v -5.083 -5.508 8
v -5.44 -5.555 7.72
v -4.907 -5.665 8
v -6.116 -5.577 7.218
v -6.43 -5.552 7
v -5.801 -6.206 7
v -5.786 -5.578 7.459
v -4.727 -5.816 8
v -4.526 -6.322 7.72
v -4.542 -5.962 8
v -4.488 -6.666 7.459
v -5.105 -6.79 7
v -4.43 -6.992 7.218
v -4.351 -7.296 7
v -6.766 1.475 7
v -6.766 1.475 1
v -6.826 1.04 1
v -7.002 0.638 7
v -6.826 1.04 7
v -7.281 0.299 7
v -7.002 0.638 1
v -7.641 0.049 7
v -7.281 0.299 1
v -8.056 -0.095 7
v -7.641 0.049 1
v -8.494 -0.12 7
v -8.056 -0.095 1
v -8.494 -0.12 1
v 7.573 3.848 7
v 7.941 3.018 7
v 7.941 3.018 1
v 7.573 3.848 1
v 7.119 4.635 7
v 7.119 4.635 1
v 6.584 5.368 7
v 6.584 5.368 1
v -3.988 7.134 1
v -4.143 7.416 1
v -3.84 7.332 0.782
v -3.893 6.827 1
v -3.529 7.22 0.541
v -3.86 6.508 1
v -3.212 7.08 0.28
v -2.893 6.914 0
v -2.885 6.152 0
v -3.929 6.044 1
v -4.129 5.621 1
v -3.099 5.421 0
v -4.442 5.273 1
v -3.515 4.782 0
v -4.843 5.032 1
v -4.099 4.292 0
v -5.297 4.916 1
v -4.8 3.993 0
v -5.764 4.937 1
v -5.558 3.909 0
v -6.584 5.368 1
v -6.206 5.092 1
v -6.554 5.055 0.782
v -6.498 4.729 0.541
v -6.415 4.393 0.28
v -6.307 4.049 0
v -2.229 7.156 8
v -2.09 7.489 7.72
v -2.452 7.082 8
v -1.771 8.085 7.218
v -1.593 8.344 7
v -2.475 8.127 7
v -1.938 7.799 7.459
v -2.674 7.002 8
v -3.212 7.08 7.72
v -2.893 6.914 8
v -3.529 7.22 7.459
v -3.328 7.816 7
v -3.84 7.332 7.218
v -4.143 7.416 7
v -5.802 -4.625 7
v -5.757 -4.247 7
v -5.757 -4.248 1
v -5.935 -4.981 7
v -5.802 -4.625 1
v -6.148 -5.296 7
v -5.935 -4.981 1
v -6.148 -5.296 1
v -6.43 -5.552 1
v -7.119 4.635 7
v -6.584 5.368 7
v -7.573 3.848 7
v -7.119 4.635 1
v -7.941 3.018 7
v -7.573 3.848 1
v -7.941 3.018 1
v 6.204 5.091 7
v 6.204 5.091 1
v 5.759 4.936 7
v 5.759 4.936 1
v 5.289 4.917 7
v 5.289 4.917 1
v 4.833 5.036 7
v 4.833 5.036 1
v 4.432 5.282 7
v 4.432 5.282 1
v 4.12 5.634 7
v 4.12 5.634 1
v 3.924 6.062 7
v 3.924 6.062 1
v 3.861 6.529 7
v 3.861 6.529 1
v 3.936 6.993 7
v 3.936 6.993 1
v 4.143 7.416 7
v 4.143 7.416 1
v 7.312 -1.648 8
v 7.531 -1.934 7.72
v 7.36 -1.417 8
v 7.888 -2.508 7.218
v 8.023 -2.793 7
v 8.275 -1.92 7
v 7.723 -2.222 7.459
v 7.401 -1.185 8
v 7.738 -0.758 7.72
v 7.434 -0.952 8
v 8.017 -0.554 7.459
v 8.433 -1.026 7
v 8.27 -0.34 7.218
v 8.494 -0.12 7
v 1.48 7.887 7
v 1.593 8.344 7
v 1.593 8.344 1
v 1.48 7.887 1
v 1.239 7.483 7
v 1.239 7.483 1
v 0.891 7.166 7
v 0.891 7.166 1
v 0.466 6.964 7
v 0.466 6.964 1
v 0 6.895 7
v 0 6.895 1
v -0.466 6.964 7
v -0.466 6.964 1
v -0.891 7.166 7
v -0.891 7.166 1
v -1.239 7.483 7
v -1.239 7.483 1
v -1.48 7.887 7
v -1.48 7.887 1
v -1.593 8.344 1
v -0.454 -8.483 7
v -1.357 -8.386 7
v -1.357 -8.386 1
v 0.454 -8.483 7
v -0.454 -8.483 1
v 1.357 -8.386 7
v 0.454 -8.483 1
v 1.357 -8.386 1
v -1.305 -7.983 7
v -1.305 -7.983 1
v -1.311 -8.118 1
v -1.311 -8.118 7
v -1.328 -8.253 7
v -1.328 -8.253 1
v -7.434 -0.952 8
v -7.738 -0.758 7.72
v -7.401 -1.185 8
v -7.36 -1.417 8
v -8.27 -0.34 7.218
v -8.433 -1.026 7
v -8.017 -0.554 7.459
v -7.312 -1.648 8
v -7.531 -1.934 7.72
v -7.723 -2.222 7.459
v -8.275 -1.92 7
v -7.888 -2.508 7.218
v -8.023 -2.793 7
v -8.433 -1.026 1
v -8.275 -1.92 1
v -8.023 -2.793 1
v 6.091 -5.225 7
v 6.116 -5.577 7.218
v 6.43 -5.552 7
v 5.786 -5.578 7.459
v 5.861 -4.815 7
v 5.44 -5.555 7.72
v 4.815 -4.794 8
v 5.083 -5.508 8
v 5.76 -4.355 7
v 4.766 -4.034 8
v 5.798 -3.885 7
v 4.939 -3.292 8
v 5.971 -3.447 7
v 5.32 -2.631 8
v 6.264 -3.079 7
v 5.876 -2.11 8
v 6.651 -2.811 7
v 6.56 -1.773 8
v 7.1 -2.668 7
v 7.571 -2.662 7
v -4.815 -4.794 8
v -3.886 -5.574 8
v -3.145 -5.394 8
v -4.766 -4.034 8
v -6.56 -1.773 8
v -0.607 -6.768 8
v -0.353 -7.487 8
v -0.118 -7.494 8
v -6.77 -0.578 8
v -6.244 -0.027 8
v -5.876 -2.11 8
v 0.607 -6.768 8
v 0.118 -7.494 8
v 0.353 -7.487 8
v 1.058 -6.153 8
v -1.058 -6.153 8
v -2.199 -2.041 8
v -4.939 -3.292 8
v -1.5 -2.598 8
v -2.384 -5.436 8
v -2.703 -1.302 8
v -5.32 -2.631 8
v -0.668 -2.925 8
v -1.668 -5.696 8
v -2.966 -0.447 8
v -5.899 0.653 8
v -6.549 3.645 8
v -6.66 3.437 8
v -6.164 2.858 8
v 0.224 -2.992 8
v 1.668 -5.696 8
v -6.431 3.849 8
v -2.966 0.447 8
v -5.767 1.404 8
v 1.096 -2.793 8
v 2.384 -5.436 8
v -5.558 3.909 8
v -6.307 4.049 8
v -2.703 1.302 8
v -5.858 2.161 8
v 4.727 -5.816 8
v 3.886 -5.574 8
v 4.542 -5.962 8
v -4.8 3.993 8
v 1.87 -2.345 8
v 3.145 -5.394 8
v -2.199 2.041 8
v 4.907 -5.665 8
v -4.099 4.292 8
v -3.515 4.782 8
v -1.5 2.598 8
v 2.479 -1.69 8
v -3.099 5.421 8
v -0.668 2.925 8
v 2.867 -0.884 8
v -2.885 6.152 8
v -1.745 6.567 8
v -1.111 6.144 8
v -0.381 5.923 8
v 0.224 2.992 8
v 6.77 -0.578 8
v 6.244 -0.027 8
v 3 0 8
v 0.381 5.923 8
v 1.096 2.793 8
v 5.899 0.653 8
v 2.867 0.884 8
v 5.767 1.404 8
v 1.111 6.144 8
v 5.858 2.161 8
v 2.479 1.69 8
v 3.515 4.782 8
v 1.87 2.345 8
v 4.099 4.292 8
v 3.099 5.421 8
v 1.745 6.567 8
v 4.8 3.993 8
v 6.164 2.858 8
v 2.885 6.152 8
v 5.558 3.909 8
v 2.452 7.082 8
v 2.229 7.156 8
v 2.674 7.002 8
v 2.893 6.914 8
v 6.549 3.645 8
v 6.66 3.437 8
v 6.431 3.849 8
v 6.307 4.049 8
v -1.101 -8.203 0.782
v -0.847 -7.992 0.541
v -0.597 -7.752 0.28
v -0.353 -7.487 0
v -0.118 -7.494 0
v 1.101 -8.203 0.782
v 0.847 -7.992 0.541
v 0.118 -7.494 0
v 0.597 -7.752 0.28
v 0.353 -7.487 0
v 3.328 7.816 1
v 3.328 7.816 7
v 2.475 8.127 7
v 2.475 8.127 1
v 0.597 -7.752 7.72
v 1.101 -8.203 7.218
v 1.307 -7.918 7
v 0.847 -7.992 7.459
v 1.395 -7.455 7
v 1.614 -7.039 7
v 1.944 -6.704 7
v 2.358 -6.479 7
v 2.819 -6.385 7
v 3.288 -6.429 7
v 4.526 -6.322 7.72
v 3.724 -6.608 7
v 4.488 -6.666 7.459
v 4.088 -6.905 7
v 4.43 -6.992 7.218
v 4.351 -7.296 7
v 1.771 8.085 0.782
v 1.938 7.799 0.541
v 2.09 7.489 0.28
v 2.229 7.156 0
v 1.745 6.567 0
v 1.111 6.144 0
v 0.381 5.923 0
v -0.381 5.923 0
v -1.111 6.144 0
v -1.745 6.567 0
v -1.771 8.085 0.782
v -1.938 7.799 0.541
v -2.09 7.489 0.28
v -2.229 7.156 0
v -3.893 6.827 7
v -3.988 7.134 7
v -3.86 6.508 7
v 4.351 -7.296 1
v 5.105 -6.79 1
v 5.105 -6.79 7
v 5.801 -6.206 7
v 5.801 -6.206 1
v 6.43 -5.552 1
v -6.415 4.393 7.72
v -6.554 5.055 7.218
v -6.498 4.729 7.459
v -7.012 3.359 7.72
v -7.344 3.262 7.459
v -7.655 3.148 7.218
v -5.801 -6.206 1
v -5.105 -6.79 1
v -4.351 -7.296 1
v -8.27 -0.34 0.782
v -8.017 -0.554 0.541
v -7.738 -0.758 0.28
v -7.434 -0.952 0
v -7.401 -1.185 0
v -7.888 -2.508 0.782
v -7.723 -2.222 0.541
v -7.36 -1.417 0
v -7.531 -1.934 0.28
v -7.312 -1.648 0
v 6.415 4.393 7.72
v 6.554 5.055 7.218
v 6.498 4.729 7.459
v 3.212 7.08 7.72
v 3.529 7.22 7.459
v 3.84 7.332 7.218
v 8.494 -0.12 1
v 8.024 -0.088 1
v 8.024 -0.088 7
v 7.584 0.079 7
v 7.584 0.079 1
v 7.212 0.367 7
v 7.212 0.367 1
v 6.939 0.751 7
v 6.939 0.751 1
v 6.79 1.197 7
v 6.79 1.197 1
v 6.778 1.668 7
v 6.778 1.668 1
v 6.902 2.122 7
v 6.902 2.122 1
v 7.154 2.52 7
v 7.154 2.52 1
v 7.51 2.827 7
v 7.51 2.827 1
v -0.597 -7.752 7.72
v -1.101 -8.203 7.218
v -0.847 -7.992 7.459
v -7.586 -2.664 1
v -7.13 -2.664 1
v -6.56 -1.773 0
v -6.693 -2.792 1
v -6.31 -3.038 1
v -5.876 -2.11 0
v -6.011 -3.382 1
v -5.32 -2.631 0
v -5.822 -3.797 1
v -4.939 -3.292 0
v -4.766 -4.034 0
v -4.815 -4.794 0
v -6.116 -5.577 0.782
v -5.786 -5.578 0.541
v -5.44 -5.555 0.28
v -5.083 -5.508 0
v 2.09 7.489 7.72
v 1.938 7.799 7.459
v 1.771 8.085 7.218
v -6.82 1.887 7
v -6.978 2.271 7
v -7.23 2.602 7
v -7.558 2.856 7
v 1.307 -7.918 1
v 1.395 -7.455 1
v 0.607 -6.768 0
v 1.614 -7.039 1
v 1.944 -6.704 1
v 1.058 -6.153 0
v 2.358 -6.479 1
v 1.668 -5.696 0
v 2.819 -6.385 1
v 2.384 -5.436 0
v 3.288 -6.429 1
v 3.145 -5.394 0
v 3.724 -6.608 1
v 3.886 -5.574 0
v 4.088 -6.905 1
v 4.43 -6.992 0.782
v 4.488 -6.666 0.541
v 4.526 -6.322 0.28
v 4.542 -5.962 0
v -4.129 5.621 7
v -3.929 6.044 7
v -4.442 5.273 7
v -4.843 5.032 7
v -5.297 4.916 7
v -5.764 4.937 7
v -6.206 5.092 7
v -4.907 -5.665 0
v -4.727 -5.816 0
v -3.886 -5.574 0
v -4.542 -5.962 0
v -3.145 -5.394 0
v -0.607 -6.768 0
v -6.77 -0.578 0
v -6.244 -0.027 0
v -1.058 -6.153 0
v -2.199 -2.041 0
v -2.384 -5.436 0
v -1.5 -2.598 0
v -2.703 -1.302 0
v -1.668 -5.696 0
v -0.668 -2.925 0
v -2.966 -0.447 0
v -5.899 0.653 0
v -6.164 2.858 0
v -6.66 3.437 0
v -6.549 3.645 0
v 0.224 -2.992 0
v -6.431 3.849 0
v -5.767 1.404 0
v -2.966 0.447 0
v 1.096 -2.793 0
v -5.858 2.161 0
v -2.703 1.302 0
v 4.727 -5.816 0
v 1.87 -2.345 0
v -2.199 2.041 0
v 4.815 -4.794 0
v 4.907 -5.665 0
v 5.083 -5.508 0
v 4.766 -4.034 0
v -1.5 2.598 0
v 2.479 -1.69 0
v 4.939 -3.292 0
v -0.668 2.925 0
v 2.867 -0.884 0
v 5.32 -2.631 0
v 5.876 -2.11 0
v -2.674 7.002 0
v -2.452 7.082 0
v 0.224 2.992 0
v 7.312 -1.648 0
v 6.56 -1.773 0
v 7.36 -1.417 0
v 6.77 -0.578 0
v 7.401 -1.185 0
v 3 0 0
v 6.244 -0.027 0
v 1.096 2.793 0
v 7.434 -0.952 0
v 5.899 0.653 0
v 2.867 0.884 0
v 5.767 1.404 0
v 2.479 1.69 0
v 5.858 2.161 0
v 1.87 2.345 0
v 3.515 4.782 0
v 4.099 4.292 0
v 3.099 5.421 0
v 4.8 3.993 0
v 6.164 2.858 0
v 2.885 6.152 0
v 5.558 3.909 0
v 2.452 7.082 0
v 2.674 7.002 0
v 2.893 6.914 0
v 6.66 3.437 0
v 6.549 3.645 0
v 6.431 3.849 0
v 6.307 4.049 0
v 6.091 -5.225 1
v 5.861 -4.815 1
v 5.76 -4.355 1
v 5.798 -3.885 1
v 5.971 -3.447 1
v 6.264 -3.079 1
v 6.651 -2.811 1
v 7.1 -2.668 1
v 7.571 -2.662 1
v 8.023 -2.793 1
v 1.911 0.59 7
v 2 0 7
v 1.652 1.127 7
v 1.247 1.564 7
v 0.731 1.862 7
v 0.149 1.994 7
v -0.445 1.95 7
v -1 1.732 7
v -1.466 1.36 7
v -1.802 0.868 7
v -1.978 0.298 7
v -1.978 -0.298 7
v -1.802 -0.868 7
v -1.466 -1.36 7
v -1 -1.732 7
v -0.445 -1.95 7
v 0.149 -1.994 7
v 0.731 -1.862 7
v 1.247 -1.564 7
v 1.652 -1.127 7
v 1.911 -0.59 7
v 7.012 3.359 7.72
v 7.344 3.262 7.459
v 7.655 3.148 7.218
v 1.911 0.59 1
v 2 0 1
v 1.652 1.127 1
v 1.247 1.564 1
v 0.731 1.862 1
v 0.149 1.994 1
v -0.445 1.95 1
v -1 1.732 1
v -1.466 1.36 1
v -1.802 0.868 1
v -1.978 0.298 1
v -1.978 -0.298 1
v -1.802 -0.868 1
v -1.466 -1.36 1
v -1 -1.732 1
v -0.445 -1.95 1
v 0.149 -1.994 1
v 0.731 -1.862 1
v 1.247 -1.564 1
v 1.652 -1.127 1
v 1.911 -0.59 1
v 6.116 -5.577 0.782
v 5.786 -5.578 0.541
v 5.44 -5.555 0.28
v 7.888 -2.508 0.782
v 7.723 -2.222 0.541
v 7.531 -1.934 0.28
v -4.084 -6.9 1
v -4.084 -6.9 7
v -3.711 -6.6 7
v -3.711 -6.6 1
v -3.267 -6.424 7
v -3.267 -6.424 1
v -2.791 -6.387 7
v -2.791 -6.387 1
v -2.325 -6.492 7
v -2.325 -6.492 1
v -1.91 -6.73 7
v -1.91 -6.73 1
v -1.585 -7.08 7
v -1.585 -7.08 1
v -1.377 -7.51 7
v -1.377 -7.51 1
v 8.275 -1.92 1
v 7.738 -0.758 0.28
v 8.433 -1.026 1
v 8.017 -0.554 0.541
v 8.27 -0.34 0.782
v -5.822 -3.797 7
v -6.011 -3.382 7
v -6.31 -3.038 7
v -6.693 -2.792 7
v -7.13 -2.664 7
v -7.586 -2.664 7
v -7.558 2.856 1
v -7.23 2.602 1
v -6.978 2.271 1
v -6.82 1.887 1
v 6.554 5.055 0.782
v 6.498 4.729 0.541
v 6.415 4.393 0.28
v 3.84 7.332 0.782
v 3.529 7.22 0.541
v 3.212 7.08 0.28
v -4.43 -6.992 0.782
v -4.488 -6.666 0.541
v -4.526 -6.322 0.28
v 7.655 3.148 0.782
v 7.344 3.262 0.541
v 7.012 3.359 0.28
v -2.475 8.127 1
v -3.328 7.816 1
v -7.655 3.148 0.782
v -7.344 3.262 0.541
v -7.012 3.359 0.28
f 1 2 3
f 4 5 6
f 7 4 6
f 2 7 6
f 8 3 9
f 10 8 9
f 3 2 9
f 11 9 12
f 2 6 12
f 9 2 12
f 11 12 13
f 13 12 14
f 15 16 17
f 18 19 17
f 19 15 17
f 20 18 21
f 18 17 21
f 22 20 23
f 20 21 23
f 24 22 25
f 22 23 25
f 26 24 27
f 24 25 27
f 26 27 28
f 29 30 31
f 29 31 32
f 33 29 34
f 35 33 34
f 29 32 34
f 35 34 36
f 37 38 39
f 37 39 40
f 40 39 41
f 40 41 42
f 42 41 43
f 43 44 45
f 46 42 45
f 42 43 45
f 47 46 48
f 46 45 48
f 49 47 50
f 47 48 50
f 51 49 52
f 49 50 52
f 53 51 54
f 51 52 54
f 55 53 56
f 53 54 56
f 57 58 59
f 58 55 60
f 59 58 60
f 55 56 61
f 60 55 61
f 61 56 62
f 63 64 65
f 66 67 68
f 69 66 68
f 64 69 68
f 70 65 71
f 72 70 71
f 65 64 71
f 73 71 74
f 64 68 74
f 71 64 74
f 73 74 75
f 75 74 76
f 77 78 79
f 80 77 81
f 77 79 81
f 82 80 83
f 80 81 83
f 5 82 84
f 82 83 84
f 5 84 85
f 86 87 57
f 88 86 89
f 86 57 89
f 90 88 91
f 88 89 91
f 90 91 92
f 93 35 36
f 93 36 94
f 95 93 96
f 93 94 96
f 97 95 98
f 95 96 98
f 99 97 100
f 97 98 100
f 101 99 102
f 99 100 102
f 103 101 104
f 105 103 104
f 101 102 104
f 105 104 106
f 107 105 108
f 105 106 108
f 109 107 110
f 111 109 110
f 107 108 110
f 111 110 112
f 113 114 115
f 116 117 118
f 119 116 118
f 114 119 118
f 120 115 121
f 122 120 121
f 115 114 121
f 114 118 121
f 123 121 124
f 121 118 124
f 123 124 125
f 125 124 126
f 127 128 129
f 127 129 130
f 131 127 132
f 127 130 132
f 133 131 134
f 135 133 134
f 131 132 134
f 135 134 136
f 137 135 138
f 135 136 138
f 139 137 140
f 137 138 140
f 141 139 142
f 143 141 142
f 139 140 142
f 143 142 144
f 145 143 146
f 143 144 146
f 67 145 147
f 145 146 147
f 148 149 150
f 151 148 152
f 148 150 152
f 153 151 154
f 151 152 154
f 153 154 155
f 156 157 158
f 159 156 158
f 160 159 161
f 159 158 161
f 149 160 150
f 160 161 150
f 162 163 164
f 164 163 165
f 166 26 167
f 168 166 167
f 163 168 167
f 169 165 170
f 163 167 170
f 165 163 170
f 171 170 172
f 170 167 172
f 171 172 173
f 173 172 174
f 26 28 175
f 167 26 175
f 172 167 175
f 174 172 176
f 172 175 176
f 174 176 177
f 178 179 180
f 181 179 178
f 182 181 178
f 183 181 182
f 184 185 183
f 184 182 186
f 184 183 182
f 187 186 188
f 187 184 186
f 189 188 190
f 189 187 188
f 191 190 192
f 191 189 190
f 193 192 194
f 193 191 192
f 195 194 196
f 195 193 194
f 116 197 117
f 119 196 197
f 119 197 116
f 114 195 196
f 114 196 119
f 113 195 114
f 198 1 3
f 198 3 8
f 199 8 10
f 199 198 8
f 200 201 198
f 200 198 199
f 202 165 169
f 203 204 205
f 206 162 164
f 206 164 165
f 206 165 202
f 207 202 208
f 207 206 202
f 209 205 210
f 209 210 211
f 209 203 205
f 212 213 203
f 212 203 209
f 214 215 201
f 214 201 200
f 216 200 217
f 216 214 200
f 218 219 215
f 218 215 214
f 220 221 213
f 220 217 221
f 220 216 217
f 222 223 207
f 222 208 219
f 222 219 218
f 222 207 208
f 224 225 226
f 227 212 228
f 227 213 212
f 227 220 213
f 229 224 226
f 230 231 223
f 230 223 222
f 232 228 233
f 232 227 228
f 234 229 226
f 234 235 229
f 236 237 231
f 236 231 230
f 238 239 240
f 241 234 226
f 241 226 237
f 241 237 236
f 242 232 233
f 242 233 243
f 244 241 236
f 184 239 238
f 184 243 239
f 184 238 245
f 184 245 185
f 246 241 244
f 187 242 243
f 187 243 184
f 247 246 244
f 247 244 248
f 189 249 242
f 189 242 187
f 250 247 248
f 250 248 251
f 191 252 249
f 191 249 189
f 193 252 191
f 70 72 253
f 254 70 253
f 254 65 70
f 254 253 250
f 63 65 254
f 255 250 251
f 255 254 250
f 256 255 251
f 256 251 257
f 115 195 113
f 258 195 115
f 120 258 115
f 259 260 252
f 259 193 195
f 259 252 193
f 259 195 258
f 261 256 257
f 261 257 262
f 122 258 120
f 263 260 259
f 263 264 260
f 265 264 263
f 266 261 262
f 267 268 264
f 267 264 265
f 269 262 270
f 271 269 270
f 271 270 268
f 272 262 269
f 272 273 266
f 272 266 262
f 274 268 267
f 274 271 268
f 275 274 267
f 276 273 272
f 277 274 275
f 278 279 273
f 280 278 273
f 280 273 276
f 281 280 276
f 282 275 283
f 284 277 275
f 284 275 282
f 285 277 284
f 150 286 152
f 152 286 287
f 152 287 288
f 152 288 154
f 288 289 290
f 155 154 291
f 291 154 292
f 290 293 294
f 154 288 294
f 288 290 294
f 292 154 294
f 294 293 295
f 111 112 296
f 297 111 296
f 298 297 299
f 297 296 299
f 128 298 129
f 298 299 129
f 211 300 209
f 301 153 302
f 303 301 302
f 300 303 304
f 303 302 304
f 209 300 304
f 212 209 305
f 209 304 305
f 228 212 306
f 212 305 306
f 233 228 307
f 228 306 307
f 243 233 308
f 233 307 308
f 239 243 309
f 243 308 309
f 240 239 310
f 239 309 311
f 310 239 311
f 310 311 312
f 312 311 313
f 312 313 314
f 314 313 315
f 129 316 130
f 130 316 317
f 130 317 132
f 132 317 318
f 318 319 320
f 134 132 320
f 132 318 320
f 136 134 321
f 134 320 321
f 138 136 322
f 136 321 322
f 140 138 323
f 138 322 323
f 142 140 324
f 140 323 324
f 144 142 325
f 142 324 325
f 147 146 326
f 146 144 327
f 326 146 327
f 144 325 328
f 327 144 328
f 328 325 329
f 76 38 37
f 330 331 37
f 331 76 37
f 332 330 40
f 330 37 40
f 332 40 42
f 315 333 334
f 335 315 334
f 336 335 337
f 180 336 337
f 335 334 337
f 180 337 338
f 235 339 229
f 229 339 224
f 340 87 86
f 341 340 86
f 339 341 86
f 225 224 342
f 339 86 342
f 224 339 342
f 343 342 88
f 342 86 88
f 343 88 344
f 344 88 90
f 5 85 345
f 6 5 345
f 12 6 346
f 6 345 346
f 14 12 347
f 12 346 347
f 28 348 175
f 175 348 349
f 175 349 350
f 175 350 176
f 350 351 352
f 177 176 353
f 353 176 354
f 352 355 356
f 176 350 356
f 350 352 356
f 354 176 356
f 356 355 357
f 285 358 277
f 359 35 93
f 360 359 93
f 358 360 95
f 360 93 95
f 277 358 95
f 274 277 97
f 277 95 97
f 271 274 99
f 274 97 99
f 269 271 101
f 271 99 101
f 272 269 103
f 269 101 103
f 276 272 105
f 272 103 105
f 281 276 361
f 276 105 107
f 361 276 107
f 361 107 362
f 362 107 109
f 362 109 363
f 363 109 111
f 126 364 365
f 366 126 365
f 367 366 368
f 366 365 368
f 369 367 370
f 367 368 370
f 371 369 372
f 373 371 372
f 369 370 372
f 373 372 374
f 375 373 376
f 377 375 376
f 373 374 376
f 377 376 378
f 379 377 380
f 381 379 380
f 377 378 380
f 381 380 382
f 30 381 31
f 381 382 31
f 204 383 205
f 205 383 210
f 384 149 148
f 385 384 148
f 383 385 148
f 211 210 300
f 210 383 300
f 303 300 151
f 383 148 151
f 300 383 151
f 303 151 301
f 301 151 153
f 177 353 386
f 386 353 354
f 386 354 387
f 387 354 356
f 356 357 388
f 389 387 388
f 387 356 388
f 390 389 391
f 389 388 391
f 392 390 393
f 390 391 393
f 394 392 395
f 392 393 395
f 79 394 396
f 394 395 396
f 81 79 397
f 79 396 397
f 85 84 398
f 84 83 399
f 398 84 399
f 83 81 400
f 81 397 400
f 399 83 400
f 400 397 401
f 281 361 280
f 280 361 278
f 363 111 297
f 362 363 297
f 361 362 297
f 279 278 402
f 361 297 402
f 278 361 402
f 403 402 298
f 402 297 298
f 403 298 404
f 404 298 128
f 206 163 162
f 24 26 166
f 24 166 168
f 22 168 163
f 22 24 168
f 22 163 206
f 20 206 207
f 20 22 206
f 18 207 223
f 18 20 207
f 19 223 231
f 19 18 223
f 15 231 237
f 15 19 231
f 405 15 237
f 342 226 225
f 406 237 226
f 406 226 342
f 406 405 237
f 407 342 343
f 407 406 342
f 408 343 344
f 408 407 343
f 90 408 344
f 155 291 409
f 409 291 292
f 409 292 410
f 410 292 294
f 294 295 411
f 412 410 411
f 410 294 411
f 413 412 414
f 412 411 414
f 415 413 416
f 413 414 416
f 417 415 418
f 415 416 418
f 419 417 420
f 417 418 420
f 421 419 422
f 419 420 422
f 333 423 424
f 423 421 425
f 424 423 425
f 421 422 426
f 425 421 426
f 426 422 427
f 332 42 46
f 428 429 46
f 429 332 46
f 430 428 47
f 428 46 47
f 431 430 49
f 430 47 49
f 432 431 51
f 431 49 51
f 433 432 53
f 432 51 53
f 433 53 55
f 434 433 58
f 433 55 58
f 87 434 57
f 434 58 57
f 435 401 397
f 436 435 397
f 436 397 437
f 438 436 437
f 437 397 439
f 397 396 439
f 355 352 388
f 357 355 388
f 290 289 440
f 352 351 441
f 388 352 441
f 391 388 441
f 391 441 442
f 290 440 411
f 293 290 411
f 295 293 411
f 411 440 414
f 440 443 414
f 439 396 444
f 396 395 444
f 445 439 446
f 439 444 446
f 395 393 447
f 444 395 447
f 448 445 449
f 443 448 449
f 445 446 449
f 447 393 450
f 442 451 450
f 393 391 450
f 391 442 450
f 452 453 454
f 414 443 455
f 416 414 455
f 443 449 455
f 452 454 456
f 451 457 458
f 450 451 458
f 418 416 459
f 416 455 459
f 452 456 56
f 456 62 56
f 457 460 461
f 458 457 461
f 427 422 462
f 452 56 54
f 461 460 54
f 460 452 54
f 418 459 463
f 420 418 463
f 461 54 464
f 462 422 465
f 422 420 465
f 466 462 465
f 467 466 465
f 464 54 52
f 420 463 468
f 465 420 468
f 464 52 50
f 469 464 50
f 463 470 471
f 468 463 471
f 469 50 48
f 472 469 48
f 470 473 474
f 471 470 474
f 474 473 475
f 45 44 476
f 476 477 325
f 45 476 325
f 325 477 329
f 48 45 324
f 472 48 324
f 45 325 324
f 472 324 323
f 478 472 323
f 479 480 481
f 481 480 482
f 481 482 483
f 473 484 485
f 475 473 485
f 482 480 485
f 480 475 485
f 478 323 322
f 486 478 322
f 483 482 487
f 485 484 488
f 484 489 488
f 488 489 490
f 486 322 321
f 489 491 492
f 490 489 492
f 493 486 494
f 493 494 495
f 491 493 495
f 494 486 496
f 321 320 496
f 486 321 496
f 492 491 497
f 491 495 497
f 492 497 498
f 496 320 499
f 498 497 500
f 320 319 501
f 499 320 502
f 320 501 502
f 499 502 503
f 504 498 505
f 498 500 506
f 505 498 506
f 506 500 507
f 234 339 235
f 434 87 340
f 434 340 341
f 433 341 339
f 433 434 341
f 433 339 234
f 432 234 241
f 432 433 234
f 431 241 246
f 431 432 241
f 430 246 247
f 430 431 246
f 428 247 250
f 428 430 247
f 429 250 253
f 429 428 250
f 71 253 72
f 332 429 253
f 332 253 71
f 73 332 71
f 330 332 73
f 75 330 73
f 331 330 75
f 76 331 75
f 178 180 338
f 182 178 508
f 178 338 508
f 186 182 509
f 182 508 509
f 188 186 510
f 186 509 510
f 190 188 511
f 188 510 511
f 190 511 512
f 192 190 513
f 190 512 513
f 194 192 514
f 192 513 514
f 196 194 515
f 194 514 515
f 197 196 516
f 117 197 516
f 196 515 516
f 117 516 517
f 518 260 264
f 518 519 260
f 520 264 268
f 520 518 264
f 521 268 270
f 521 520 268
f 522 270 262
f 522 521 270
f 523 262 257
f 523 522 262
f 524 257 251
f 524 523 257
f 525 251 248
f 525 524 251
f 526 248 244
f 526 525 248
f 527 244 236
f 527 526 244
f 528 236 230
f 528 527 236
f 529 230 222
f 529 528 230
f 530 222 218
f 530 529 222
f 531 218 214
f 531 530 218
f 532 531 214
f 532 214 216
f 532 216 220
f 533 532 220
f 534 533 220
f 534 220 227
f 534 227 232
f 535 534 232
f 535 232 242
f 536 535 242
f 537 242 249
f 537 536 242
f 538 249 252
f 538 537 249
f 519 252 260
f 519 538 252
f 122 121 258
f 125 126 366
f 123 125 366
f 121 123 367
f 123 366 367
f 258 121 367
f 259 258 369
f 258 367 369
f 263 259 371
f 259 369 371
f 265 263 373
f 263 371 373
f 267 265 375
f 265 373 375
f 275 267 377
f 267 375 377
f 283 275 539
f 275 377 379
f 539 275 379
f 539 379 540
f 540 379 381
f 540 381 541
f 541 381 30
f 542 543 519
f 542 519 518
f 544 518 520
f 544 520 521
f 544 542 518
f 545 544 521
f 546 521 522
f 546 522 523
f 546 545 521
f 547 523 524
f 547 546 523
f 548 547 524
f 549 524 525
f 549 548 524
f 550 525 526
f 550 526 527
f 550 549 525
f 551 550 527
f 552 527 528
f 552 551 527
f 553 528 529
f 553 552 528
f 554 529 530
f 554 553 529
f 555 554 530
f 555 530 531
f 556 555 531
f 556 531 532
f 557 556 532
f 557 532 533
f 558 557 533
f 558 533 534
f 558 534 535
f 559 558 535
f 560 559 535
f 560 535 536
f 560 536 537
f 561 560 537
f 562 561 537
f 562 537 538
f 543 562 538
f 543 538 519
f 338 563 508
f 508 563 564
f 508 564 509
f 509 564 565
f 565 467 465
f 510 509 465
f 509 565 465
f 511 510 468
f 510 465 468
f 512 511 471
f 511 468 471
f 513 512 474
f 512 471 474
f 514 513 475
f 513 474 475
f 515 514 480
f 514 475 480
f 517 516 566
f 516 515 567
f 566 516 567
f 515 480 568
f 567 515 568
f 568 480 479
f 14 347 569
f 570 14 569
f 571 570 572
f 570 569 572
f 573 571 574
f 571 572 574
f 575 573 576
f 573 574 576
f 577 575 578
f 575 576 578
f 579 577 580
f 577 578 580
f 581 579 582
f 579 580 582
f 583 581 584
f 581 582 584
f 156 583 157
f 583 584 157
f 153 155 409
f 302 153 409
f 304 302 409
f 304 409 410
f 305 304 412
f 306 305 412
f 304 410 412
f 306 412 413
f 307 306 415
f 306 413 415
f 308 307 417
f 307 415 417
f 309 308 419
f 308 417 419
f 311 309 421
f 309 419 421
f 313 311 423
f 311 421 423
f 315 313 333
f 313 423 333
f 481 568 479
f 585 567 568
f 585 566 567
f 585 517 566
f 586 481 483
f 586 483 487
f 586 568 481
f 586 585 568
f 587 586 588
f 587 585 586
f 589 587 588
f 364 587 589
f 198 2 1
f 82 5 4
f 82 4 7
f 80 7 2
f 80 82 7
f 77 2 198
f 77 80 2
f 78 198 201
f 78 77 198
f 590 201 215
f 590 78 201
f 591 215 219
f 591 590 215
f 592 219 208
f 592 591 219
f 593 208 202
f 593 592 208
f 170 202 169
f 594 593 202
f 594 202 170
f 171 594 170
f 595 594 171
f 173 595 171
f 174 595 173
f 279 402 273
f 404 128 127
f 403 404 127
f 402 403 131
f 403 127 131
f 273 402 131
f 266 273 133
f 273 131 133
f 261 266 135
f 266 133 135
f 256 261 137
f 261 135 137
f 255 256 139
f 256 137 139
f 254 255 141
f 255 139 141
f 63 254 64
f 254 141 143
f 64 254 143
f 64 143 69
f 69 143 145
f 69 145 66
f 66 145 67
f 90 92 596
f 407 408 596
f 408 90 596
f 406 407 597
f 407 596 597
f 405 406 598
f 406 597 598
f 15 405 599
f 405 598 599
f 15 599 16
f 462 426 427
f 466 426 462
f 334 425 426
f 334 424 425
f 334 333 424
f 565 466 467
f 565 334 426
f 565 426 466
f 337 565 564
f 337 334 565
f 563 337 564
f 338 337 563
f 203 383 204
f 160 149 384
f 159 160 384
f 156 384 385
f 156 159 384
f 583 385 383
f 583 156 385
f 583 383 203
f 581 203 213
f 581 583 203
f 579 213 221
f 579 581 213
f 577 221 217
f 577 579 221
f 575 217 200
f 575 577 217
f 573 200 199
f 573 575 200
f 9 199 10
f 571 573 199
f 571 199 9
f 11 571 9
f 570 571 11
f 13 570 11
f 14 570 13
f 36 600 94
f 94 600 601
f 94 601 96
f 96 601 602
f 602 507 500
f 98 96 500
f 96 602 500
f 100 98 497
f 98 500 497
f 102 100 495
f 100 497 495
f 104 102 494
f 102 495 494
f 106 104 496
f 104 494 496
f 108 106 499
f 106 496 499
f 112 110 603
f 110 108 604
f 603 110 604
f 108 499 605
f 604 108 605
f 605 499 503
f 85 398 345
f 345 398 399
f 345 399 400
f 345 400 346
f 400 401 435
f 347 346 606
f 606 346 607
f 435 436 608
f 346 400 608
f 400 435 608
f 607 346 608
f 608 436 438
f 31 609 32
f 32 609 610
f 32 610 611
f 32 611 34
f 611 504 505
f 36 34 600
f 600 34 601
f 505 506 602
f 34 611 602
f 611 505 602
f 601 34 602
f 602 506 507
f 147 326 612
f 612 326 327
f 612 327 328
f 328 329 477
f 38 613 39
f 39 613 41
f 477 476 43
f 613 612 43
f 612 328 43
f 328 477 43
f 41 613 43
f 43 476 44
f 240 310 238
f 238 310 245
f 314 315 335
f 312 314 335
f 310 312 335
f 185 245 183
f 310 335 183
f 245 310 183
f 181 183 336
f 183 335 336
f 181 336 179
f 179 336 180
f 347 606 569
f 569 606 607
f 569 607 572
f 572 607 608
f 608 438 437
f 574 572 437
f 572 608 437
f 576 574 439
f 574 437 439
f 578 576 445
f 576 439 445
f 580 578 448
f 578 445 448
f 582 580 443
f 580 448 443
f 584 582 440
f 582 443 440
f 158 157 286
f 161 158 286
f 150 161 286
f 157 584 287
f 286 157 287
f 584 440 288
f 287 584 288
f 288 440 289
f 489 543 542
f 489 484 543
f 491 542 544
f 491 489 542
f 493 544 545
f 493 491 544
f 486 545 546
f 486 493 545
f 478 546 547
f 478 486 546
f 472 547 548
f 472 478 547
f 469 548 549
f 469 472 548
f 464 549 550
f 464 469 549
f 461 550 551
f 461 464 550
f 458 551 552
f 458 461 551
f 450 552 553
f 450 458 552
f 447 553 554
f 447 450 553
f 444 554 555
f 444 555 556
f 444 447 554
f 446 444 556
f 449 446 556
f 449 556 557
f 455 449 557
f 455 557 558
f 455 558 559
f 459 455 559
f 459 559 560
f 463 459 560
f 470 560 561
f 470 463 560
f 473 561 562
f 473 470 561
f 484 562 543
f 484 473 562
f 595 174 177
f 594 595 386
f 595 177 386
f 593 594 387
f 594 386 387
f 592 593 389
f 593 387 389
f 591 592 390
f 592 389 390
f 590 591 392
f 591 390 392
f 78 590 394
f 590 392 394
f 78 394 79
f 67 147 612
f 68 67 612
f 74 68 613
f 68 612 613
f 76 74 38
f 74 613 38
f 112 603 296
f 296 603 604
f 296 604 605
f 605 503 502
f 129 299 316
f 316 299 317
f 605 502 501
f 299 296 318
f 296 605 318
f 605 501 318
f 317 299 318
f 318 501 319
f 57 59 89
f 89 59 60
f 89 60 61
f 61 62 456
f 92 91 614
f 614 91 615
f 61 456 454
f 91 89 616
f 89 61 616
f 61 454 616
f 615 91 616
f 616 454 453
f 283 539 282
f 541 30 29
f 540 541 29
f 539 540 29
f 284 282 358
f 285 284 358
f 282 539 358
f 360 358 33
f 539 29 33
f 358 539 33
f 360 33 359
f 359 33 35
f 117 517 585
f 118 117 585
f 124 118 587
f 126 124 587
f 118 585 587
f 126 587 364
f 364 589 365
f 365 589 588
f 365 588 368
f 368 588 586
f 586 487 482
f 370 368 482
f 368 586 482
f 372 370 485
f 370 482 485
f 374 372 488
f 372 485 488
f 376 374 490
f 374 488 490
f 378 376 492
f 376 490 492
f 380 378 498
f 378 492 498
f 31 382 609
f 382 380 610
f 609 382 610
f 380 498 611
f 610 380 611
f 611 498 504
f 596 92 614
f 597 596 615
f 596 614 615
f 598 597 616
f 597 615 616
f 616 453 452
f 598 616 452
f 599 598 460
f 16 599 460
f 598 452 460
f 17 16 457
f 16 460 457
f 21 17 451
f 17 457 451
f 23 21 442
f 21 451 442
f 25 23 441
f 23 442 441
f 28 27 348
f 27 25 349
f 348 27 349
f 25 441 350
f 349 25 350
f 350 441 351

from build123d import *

# Parameters (mm, degrees)
F0_R         = 2
F1_DEPTH     = 8
F2_T2_ANGLE  = 353.6374425132
F2_T4_ANGLE  = 53.075870109
F2_T6_ANGLE  = 353.6374425132
F2_T8_ANGLE  = 53.075870109
F2_T10_ANGLE = 353.6374425132
F2_T12_ANGLE = 53.075870109
F2_T14_ANGLE = 353.6374425132
F2_T16_ANGLE = 53.075870109
F2_T18_ANGLE = 353.6374425132
F2_T20_ANGLE = 53.075870109
F2_T22_ANGLE = 353.6374425132
F2_T24_ANGLE = 53.075870109
F2_T26_ANGLE = 353.6374425132
F2_T28_ANGLE = 53.075870109
F2_T30_ANGLE = 353.6374425132
F2_T32_ANGLE = 53.075870109
F2_T34_ANGLE = 353.6374425132
F2_T36_ANGLE = 53.075870109
F2_T40_ANGLE = 353.6374425132
F2_T42_ANGLE = 53.075870109
F2_T44_ANGLE = 353.6374425132
F2_T46_ANGLE = 53.075870109
F2_T48_ANGLE = 353.6374425132
F2_T50_ANGLE = 53.075870109
F2_T52_ANGLE = 353.6374425132
F2_T54_ANGLE = 53.075870109
F2_T56_ANGLE = 353.6374425132
F2_T58_ANGLE = 53.075870109
F2_T60_ANGLE = 353.6374425132
F2_T62_ANGLE = 53.075870109
F2_T64_ANGLE = 353.6374425132
F2_T66_ANGLE = 53.075870109
F2_T68_ANGLE = 353.6374425132
F2_T70_ANGLE = 53.075870109
F2_T72_ANGLE = 353.6374425132
F2_T74_ANGLE = 53.075870109


# Not quite as in the source:
# - a fillet or chamfer that OpenCascade refuses, or shapes differently, is made with other operations: its cross-section is extruded or revolved along the edge and cut away or added


with BuildPart() as f1:
    # F0 (on Top) → F1 (new body)
    with BuildSketch(Plane.XY):
        with BuildLine():
            ThreePointArc((8.4941564461, -0.1197132759), (6.790249457, 1.197304185), (7.9409517805, 3.0176662871))
            ThreePointArc((7.9409517805, 3.0176662871), (7.3568858051, 4.2475), (6.583851555, 5.3682328285))
            ThreePointArc((6.583851555, 5.3682328285), (4.4320205688, 5.2818764353), (4.1434034849, 7.416011904))
            ThreePointArc((4.1434034849, 7.416011904), (2.9054611176, 7.9826888136), (1.59288935, 8.3443231313))
            ThreePointArc((1.59288935, 8.3443231313), (0, 6.895), (-1.59288935, 8.3443231313))
            ThreePointArc((-1.59288935, 8.3443231313), (-2.9054611176, 7.9826888136), (-4.1434034849, 7.416011904))
            ThreePointArc((-4.1434034849, 7.416011904), (-3.932847998, 6.983297681), (-3.8604807443, 6.5075475443))
            ThreePointArc((-3.8604807443, 6.5075475443), (-4.8429830913, 5.0315066747), (-6.583851555, 5.3682328285))
            ThreePointArc((-6.583851555, 5.3682328285), (-7.3568858051, 4.2475), (-7.9409517805, 3.0176662871))
            ThreePointArc((-7.9409517805, 3.0176662871), (-7.0931527728, 2.4446813329), (-6.7659418618, 1.4751412693))
            ThreePointArc((-6.7659418618, 1.4751412693), (-7.2808481642, 0.2993131919), (-8.4941564461, -0.1197132759))
            ThreePointArc((-8.4941564461, -0.1197132759), (-8.3659418618, -1.4751412693), (-8.022840484, -2.7926789231))
            ThreePointArc((-8.022840484, -2.7926789231), (-6.4924575219, -2.90111085), (-5.7568858051, -4.2475))
            ThreePointArc((-5.7568858051, -4.2475), (-5.9350743771, -4.9812930656), (-6.4299511341, -5.5516442081))
            ThreePointArc((-6.4299511341, -5.5516442081), (-5.4604807443, -6.5075475443), (-4.3507529612, -7.2962986281))
            ThreePointArc((-4.3507529612, -7.2962986281), (-2.5536564486, -6.4218449793), (-1.3054611176, -7.9826888136))
            ThreePointArc((-1.3054611176, -7.9826888136), (-1.318423401, -8.1859405941), (-1.3571002254, -8.3858991157))
            ThreePointArc((-1.3571002254, -8.3858991157), (0, -8.495), (1.3571002254, -8.3858991157))
            ThreePointArc((1.3571002254, -8.3858991157), (2.3582288882, -6.4791806203), (4.3507529612, -7.2962986281))
            ThreePointArc((4.3507529612, -7.2962986281), (5.4604807443, -6.5075475443), (6.4299511341, -5.5516442081))
            ThreePointArc((6.4299511341, -5.5516442081), (5.9712451591, -3.4475), (8.022840484, -2.7926789231))
            ThreePointArc((8.022840484, -2.7926789231), (8.3659418618, -1.4751412693), (8.4941564461, -0.1197132759))
        make_face()
        Circle(F0_R, mode=Mode.SUBTRACT)
    extrude(amount=F1_DEPTH)

    # F2: chamfer of 1 on 38 edges, made by hand

    # F2_s1 → F2_t2 (revolve, cut)
    with BuildSketch(Plane(origin=(0.2580100634, 0.3945620225, 0), x_dir=(0, 0, 1), z_dir=(0.5472897836, 0.8369431837, 0))):
        Polygon((7, 10.0819087839), (8, 11.0819087839), (8, 10.0819087839), align=None)
    revolve(axis=Axis((7.3568858051, -4.2475, 8), (0, 0, -1)), revolution_arc=F2_T2_ANGLE, mode=Mode.SUBTRACT)

    # F2_s3 → F2_t4 (revolve, cut)
    with BuildSketch(Plane(origin=(0, 0, 0), x_dir=(0, 0, 1), z_dir=(-0.5953548832, -0.8034628573, 0))):
        Polygon((8, -7.495), (7, -8.495), (8, -8.495), align=None)
    revolve(axis=Axis((0, 0, 8), (0, 0, 1)), revolution_arc=F2_T4_ANGLE, mode=Mode.SUBTRACT)

    # F2_s5 → F2_t6 (revolve, cut)
    with BuildSketch(Plane(origin=(-0.055972404, 0.4680977167, 0), x_dir=(0, 0, 1), z_dir=(-0.118728411, 0.9929267669, 0))):
        Polygon((8, 11.0819087839), (7, 10.0819087839), (8, 10.0819087839), align=None)
    revolve(axis=Axis((8.3659418618, 1.4751412693, 8), (0, 0, -1)), revolution_arc=F2_T6_ANGLE, mode=Mode.SUBTRACT)

    # F2_s7 → F2_t8 (revolve, cut)
    with BuildSketch(Plane(origin=(0, 0, 0), x_dir=(0, 0, 1), z_dir=(0.0603876695, -0.9981749994, 0))):
        Polygon((8, -7.495), (7, -8.495), (8, -8.495), align=None)
    revolve(axis=Axis((0, 0, 8), (0, 0, 1)), revolution_arc=F2_T8_ANGLE, mode=Mode.SUBTRACT)

    # F2_s9 → F2_t10 (revolve, cut)
    with BuildSketch(Plane(origin=(-0.3437647615, 0.322605287, 0), x_dir=(0, 0, 1), z_dir=(-0.7291922626, 0.6843088807, 0))):
        Polygon((8, 11.0819087839), (7, 10.0819087839), (8, 10.0819087839), align=None)
    revolve(axis=Axis((5.4604807443, 6.5075475443, 8), (0, 0, -1)), revolution_arc=F2_T10_ANGLE, mode=Mode.SUBTRACT)

    # F2_s11 → F2_t12 (revolve, cut)
    with BuildSketch(Plane(origin=(0, 0, 0), x_dir=(0, 0, 1), z_dir=(0.6878741606, -0.7258299658, 0))):
        Polygon((8, -7.495), (7, -8.495), (8, -8.495), align=None)
    revolve(axis=Axis((0, 0, 8), (0, 0, 1)), revolution_arc=F2_T12_ANGLE, mode=Mode.SUBTRACT)

    # F2_s13 → F2_t14 (revolve, cut)
    with BuildSketch(Plane(origin=(-0.4707057666, 0.0261622581, 0), x_dir=(0, 0, 1), z_dir=(-0.9984589504, 0.0554952639, 0))):
        Polygon((8, 11.0819087839), (7, 10.0819087839), (8, 10.0819087839), align=None)
    revolve(axis=Axis((0, 8.495, 8), (0, 0, -1)), revolution_arc=F2_T14_ANGLE, mode=Mode.SUBTRACT)

    # F2_s15 → F2_t16 (revolve, cut)
    with BuildSketch(Plane(origin=(0, 0, 0), x_dir=(0, 0, 1), z_dir=(0.993496687, -0.1138610245, 0))):
        Polygon((8, -7.495), (7, -8.495), (8, -8.495), align=None)
    revolve(axis=Axis((0, 0, 8), (0, 0, 1)), revolution_arc=F2_T16_ANGLE, mode=Mode.SUBTRACT)

    # F2_s17 → F2_t18 (revolve, cut)
    with BuildSketch(Plane(origin=(0.3437647615, 0.322605287, 0), x_dir=(0, 0, 1), z_dir=(0.7291922626, 0.6843088807, 0))):
        Polygon((8, -11.0819087839), (7, -10.0819087839), (8, -10.0819087839), align=None)
    revolve(axis=Axis((-5.4604807443, 6.5075475443, 8), (0, 0, 1)), revolution_arc=F2_T18_ANGLE, mode=Mode.SUBTRACT)

    # F2_s19 → F2_t20 (revolve, cut)
    with BuildSketch(Plane(origin=(0, 0, 0), x_dir=(0, 0, 1), z_dir=(0.8342510721, 0.5513847556, 0))):
        Polygon((8, -7.495), (7, -8.495), (8, -8.495), align=None)
    revolve(axis=Axis((0, 0, 8), (0, 0, 1)), revolution_arc=F2_T20_ANGLE, mode=Mode.SUBTRACT)

    # F2_s21 → F2_t22 (revolve, cut)
    with BuildSketch(Plane(origin=(0.055972404, 0.4680977167, 0), x_dir=(0, 0, 1), z_dir=(0.118728411, 0.9929267669, 0))):
        Polygon((8, -11.0819087839), (7, -10.0819087839), (8, -10.0819087839), align=None)
    revolve(axis=Axis((-8.3659418618, 1.4751412693, 8), (0, 0, 1)), revolution_arc=F2_T22_ANGLE, mode=Mode.SUBTRACT)

    # F2_s23 → F2_t24 (revolve, cut)
    with BuildSketch(Plane(origin=(0, 0, 0), x_dir=(0, 0, 1), z_dir=(0.2846501089, 0.9586314806, 0))):
        Polygon((8, -7.495), (7, -8.495), (8, -8.495), align=None)
    revolve(axis=Axis((0, 0, 8), (0, 0, 1)), revolution_arc=F2_T24_ANGLE, mode=Mode.SUBTRACT)

    # F2_s25 → F2_t26 (revolve, cut)
    with BuildSketch(Plane(origin=(-0.2580100634, 0.3945620225, 0), x_dir=(0, 0, 1), z_dir=(-0.5472897836, 0.8369431837, 0))):
        Polygon((8, -11.0819087839), (7, -10.0819087839), (8, -10.0819087839), align=None)
    revolve(axis=Axis((-7.3568858051, -4.2475, 8), (0, 0, 1)), revolution_arc=F2_T26_ANGLE, mode=Mode.SUBTRACT)

    # F2_s27 → F2_t28 (revolve, cut)
    with BuildSketch(Plane(origin=(0, 0, 0), x_dir=(0, 0, 1), z_dir=(-0.3981418038, 0.9173238818, 0))):
        Polygon((8, -7.495), (7, -8.495), (8, -8.495), align=None)
    revolve(axis=Axis((0, 0, 8), (0, 0, 1)), revolution_arc=F2_T28_ANGLE, mode=Mode.SUBTRACT)

    # F2_s29 → F2_t30 (revolve, cut)
    with BuildSketch(Plane(origin=(-0.4512667547, 0.1364063729, 0), x_dir=(0, 0, 1), z_dir=(-0.957225006, 0.2893445833, 0))):
        Polygon((8, -11.0819087839), (7, -10.0819087839), (8, -10.0819087839), align=None)
    revolve(axis=Axis((-2.9054611176, -7.9826888136, 8), (0, 0, 1)), revolution_arc=F2_T30_ANGLE, mode=Mode.SUBTRACT)

    # F2_s31 → F2_t32 (revolve, cut)
    with BuildSketch(Plane(origin=(0, 0, 0), x_dir=(0, 0, 1), z_dir=(-0.8946387416, 0.4467902438, 0))):
        Polygon((8, -7.495), (7, -8.495), (8, -8.495), align=None)
    revolve(axis=Axis((0, 0, 8), (0, 0, 1)), revolution_arc=F2_T32_ANGLE, mode=Mode.SUBTRACT)

    # F2_s33 → F2_t34 (revolve, cut)
    with BuildSketch(Plane(origin=(0.4512667547, 0.1364063729, 0), x_dir=(0, 0, 1), z_dir=(0.957225006, 0.2893445833, 0))):
        Polygon((8, 11.0819087839), (7, 10.0819087839), (8, 10.0819087839), align=None)
    revolve(axis=Axis((2.9054611176, -7.9826888136, 8), (0, 0, -1)), revolution_arc=F2_T34_ANGLE, mode=Mode.SUBTRACT)

    # F2_s35 → F2_t36 (revolve, cut)
    with BuildSketch(Plane(origin=(0, 0, 0), x_dir=(0, 0, 1), z_dir=(-0.9725242695, -0.2328015148, 0))):
        Polygon((8, -7.495), (7, -8.495), (8, -8.495), align=None)
    revolve(axis=Axis((0, 0, 8), (0, 0, 1)), revolution_arc=F2_T36_ANGLE, mode=Mode.SUBTRACT)

    # F2_s37 → F2_t38 (revolve, cut)
    with BuildSketch(Plane.XZ):
        Polygon((3, 8), (2, 7), (2, 8), align=None)
    revolve(axis=Axis((0, 0, 8), (0, 0, 1)), mode=Mode.SUBTRACT)

    # F2_s39 → F2_t40 (revolve, cut)
    with BuildSketch(Plane(origin=(0.2580100634, 0.3945620225, 0), x_dir=(0, 0, 1), z_dir=(0.5472897836, 0.8369431837, 0))):
        Polygon((1, 10.0819087839), (0, 11.0819087839), (0, 10.0819087839), align=None)
    revolve(axis=Axis((7.3568858051, -4.2475, 0), (0, 0, -1)), revolution_arc=F2_T40_ANGLE, mode=Mode.SUBTRACT)

    # F2_s41 → F2_t42 (revolve, cut)
    with BuildSketch(Plane(origin=(0, 0, 0), x_dir=(0, 0, 1), z_dir=(-0.5953548832, -0.8034628573, 0))):
        Polygon((0, -7.495), (1, -8.495), (0, -8.495), align=None)
    revolve(axis=Axis((0, 0, 0), (0, 0, 1)), revolution_arc=F2_T42_ANGLE, mode=Mode.SUBTRACT)

    # F2_s43 → F2_t44 (revolve, cut)
    with BuildSketch(Plane(origin=(-0.055972404, 0.4680977167, 0), x_dir=(0, 0, 1), z_dir=(-0.118728411, 0.9929267669, 0))):
        Polygon((1, 10.0819087839), (0, 11.0819087839), (0, 10.0819087839), align=None)
    revolve(axis=Axis((8.3659418618, 1.4751412693, 0), (0, 0, -1)), revolution_arc=F2_T44_ANGLE, mode=Mode.SUBTRACT)

    # F2_s45 → F2_t46 (revolve, cut)
    with BuildSketch(Plane(origin=(0, 0, 0), x_dir=(0, 0, 1), z_dir=(0.0603876695, -0.9981749994, 0))):
        Polygon((1, -8.495), (0, -7.495), (0, -8.495), align=None)
    revolve(axis=Axis((0, 0, 0), (0, 0, 1)), revolution_arc=F2_T46_ANGLE, mode=Mode.SUBTRACT)

    # F2_s47 → F2_t48 (revolve, cut)
    with BuildSketch(Plane(origin=(-0.3437647615, 0.322605287, 0), x_dir=(0, 0, 1), z_dir=(-0.7291922626, 0.6843088807, 0))):
        Polygon((1, 10.0819087839), (0, 11.0819087839), (0, 10.0819087839), align=None)
    revolve(axis=Axis((5.4604807443, 6.5075475443, 0), (0, 0, -1)), revolution_arc=F2_T48_ANGLE, mode=Mode.SUBTRACT)

    # F2_s49 → F2_t50 (revolve, cut)
    with BuildSketch(Plane(origin=(0, 0, 0), x_dir=(0, 0, 1), z_dir=(0.6878741606, -0.7258299658, 0))):
        Polygon((1, -8.495), (0, -7.495), (0, -8.495), align=None)
    revolve(axis=Axis((0, 0, 0), (0, 0, 1)), revolution_arc=F2_T50_ANGLE, mode=Mode.SUBTRACT)

    # F2_s51 → F2_t52 (revolve, cut)
    with BuildSketch(Plane(origin=(-0.4707057666, 0.0261622581, 0), x_dir=(0, 0, 1), z_dir=(-0.9984589504, 0.0554952639, 0))):
        Polygon((1, 10.0819087839), (0, 11.0819087839), (0, 10.0819087839), align=None)
    revolve(axis=Axis((0, 8.495, 0), (0, 0, -1)), revolution_arc=F2_T52_ANGLE, mode=Mode.SUBTRACT)

    # F2_s53 → F2_t54 (revolve, cut)
    with BuildSketch(Plane(origin=(0, 0, 0), x_dir=(0, 0, 1), z_dir=(0.993496687, -0.1138610245, 0))):
        Polygon((1, -8.495), (0, -7.495), (0, -8.495), align=None)
    revolve(axis=Axis((0, 0, 0), (0, 0, 1)), revolution_arc=F2_T54_ANGLE, mode=Mode.SUBTRACT)

    # F2_s55 → F2_t56 (revolve, cut)
    with BuildSketch(Plane(origin=(-0.3773983122, -0.2825223821, 0), x_dir=(0, 0, 1), z_dir=(-0.8005355987, -0.5992852036, 0))):
        Polygon((1, 10.0819087839), (0, 11.0819087839), (0, 10.0819087839), align=None)
    revolve(axis=Axis((-5.4604807443, 6.5075475443, 0), (0, 0, -1)), revolution_arc=F2_T56_ANGLE, mode=Mode.SUBTRACT)

    # F2_s57 → F2_t58 (revolve, cut)
    with BuildSketch(Plane(origin=(0, 0, 0), x_dir=(0, 0, 1), z_dir=(0.8342510721, 0.5513847556, 0))):
        Polygon((1, -8.495), (0, -7.495), (0, -8.495), align=None)
    revolve(axis=Axis((0, 0, 0), (0, 0, 1)), revolution_arc=F2_T58_ANGLE, mode=Mode.SUBTRACT)

    # F2_s59 → F2_t60 (revolve, cut)
    with BuildSketch(Plane(origin=(-0.1075019932, -0.4590116599, 0), x_dir=(0, 0, 1), z_dir=(-0.2280327434, -0.973653464, 0))):
        Polygon((1, 10.0819087839), (0, 11.0819087839), (0, 10.0819087839), align=None)
    revolve(axis=Axis((-8.3659418618, 1.4751412693, 0), (0, 0, -1)), revolution_arc=F2_T60_ANGLE, mode=Mode.SUBTRACT)

    # F2_s61 → F2_t62 (revolve, cut)
    with BuildSketch(Plane(origin=(0, 0, 0), x_dir=(0, 0, 1), z_dir=(0.2846501089, 0.9586314806, 0))):
        Polygon((1, -8.495), (0, -7.495), (0, -8.495), align=None)
    revolve(axis=Axis((0, 0, 0), (0, 0, 1)), revolution_arc=F2_T62_ANGLE, mode=Mode.SUBTRACT)

    # F2_s63 → F2_t64 (revolve, cut)
    with BuildSketch(Plane(origin=(0.2126957032, -0.4207242806, 0), x_dir=(0, 0, 1), z_dir=(0.4511691669, -0.8924384477, 0))):
        Polygon((1, 10.0819087839), (0, 11.0819087839), (0, 10.0819087839), align=None)
    revolve(axis=Axis((-7.3568858051, -4.2475, 0), (0, 0, -1)), revolution_arc=F2_T64_ANGLE, mode=Mode.SUBTRACT)

    # F2_s65 → F2_t66 (revolve, cut)
    with BuildSketch(Plane(origin=(0, 0, 0), x_dir=(0, 0, 1), z_dir=(-0.3981418038, 0.9173238818, 0))):
        Polygon((1, -8.495), (0, -7.495), (0, -8.495), align=None)
    revolve(axis=Axis((0, 0, 0), (0, 0, 1)), revolution_arc=F2_T66_ANGLE, mode=Mode.SUBTRACT)

    # F2_s67 → F2_t68 (revolve, cut)
    with BuildSketch(Plane(origin=(0.4333707161, -0.1855753346, 0), x_dir=(0, 0, 1), z_dir=(0.9192640097, -0.3936415633, 0))):
        Polygon((1, 10.0819087839), (0, 11.0819087839), (0, 10.0819087839), align=None)
    revolve(axis=Axis((-2.9054611176, -7.9826888136, 0), (0, 0, -1)), revolution_arc=F2_T68_ANGLE, mode=Mode.SUBTRACT)

    # F2_s69 → F2_t70 (revolve, cut)
    with BuildSketch(Plane(origin=(0, 0, 0), x_dir=(0, 0, 1), z_dir=(-0.8946387416, 0.4467902438, 0))):
        Polygon((1, -8.495), (0, -7.495), (0, -8.495), align=None)
    revolve(axis=Axis((0, 0, 0), (0, 0, 1)), revolution_arc=F2_T70_ANGLE, mode=Mode.SUBTRACT)

    # F2_s71 → F2_t72 (revolve, cut)
    with BuildSketch(Plane(origin=(0.4512667547, 0.1364063729, 0), x_dir=(0, 0, 1), z_dir=(0.957225006, 0.2893445833, 0))):
        Polygon((1, 10.0819087839), (0, 11.0819087839), (0, 10.0819087839), align=None)
    revolve(axis=Axis((2.9054611176, -7.9826888136, 0), (0, 0, -1)), revolution_arc=F2_T72_ANGLE, mode=Mode.SUBTRACT)

    # F2_s73 → F2_t74 (revolve, cut)
    with BuildSketch(Plane(origin=(0, 0, 0), x_dir=(0, 0, 1), z_dir=(-0.9725242695, -0.2328015148, 0))):
        Polygon((0, -7.495), (1, -8.495), (0, -8.495), align=None)
    revolve(axis=Axis((0, 0, 0), (0, 0, 1)), revolution_arc=F2_T74_ANGLE, mode=Mode.SUBTRACT)

    # F2_s75 → F2_t76 (revolve, cut)
    with BuildSketch(Plane.XZ):
        Polygon((2, 1), (3, 0), (2, 0), align=None)
    revolve(axis=Axis((0, 0, 0), (0, 0, 1)), mode=Mode.SUBTRACT)


solid = f1.part
